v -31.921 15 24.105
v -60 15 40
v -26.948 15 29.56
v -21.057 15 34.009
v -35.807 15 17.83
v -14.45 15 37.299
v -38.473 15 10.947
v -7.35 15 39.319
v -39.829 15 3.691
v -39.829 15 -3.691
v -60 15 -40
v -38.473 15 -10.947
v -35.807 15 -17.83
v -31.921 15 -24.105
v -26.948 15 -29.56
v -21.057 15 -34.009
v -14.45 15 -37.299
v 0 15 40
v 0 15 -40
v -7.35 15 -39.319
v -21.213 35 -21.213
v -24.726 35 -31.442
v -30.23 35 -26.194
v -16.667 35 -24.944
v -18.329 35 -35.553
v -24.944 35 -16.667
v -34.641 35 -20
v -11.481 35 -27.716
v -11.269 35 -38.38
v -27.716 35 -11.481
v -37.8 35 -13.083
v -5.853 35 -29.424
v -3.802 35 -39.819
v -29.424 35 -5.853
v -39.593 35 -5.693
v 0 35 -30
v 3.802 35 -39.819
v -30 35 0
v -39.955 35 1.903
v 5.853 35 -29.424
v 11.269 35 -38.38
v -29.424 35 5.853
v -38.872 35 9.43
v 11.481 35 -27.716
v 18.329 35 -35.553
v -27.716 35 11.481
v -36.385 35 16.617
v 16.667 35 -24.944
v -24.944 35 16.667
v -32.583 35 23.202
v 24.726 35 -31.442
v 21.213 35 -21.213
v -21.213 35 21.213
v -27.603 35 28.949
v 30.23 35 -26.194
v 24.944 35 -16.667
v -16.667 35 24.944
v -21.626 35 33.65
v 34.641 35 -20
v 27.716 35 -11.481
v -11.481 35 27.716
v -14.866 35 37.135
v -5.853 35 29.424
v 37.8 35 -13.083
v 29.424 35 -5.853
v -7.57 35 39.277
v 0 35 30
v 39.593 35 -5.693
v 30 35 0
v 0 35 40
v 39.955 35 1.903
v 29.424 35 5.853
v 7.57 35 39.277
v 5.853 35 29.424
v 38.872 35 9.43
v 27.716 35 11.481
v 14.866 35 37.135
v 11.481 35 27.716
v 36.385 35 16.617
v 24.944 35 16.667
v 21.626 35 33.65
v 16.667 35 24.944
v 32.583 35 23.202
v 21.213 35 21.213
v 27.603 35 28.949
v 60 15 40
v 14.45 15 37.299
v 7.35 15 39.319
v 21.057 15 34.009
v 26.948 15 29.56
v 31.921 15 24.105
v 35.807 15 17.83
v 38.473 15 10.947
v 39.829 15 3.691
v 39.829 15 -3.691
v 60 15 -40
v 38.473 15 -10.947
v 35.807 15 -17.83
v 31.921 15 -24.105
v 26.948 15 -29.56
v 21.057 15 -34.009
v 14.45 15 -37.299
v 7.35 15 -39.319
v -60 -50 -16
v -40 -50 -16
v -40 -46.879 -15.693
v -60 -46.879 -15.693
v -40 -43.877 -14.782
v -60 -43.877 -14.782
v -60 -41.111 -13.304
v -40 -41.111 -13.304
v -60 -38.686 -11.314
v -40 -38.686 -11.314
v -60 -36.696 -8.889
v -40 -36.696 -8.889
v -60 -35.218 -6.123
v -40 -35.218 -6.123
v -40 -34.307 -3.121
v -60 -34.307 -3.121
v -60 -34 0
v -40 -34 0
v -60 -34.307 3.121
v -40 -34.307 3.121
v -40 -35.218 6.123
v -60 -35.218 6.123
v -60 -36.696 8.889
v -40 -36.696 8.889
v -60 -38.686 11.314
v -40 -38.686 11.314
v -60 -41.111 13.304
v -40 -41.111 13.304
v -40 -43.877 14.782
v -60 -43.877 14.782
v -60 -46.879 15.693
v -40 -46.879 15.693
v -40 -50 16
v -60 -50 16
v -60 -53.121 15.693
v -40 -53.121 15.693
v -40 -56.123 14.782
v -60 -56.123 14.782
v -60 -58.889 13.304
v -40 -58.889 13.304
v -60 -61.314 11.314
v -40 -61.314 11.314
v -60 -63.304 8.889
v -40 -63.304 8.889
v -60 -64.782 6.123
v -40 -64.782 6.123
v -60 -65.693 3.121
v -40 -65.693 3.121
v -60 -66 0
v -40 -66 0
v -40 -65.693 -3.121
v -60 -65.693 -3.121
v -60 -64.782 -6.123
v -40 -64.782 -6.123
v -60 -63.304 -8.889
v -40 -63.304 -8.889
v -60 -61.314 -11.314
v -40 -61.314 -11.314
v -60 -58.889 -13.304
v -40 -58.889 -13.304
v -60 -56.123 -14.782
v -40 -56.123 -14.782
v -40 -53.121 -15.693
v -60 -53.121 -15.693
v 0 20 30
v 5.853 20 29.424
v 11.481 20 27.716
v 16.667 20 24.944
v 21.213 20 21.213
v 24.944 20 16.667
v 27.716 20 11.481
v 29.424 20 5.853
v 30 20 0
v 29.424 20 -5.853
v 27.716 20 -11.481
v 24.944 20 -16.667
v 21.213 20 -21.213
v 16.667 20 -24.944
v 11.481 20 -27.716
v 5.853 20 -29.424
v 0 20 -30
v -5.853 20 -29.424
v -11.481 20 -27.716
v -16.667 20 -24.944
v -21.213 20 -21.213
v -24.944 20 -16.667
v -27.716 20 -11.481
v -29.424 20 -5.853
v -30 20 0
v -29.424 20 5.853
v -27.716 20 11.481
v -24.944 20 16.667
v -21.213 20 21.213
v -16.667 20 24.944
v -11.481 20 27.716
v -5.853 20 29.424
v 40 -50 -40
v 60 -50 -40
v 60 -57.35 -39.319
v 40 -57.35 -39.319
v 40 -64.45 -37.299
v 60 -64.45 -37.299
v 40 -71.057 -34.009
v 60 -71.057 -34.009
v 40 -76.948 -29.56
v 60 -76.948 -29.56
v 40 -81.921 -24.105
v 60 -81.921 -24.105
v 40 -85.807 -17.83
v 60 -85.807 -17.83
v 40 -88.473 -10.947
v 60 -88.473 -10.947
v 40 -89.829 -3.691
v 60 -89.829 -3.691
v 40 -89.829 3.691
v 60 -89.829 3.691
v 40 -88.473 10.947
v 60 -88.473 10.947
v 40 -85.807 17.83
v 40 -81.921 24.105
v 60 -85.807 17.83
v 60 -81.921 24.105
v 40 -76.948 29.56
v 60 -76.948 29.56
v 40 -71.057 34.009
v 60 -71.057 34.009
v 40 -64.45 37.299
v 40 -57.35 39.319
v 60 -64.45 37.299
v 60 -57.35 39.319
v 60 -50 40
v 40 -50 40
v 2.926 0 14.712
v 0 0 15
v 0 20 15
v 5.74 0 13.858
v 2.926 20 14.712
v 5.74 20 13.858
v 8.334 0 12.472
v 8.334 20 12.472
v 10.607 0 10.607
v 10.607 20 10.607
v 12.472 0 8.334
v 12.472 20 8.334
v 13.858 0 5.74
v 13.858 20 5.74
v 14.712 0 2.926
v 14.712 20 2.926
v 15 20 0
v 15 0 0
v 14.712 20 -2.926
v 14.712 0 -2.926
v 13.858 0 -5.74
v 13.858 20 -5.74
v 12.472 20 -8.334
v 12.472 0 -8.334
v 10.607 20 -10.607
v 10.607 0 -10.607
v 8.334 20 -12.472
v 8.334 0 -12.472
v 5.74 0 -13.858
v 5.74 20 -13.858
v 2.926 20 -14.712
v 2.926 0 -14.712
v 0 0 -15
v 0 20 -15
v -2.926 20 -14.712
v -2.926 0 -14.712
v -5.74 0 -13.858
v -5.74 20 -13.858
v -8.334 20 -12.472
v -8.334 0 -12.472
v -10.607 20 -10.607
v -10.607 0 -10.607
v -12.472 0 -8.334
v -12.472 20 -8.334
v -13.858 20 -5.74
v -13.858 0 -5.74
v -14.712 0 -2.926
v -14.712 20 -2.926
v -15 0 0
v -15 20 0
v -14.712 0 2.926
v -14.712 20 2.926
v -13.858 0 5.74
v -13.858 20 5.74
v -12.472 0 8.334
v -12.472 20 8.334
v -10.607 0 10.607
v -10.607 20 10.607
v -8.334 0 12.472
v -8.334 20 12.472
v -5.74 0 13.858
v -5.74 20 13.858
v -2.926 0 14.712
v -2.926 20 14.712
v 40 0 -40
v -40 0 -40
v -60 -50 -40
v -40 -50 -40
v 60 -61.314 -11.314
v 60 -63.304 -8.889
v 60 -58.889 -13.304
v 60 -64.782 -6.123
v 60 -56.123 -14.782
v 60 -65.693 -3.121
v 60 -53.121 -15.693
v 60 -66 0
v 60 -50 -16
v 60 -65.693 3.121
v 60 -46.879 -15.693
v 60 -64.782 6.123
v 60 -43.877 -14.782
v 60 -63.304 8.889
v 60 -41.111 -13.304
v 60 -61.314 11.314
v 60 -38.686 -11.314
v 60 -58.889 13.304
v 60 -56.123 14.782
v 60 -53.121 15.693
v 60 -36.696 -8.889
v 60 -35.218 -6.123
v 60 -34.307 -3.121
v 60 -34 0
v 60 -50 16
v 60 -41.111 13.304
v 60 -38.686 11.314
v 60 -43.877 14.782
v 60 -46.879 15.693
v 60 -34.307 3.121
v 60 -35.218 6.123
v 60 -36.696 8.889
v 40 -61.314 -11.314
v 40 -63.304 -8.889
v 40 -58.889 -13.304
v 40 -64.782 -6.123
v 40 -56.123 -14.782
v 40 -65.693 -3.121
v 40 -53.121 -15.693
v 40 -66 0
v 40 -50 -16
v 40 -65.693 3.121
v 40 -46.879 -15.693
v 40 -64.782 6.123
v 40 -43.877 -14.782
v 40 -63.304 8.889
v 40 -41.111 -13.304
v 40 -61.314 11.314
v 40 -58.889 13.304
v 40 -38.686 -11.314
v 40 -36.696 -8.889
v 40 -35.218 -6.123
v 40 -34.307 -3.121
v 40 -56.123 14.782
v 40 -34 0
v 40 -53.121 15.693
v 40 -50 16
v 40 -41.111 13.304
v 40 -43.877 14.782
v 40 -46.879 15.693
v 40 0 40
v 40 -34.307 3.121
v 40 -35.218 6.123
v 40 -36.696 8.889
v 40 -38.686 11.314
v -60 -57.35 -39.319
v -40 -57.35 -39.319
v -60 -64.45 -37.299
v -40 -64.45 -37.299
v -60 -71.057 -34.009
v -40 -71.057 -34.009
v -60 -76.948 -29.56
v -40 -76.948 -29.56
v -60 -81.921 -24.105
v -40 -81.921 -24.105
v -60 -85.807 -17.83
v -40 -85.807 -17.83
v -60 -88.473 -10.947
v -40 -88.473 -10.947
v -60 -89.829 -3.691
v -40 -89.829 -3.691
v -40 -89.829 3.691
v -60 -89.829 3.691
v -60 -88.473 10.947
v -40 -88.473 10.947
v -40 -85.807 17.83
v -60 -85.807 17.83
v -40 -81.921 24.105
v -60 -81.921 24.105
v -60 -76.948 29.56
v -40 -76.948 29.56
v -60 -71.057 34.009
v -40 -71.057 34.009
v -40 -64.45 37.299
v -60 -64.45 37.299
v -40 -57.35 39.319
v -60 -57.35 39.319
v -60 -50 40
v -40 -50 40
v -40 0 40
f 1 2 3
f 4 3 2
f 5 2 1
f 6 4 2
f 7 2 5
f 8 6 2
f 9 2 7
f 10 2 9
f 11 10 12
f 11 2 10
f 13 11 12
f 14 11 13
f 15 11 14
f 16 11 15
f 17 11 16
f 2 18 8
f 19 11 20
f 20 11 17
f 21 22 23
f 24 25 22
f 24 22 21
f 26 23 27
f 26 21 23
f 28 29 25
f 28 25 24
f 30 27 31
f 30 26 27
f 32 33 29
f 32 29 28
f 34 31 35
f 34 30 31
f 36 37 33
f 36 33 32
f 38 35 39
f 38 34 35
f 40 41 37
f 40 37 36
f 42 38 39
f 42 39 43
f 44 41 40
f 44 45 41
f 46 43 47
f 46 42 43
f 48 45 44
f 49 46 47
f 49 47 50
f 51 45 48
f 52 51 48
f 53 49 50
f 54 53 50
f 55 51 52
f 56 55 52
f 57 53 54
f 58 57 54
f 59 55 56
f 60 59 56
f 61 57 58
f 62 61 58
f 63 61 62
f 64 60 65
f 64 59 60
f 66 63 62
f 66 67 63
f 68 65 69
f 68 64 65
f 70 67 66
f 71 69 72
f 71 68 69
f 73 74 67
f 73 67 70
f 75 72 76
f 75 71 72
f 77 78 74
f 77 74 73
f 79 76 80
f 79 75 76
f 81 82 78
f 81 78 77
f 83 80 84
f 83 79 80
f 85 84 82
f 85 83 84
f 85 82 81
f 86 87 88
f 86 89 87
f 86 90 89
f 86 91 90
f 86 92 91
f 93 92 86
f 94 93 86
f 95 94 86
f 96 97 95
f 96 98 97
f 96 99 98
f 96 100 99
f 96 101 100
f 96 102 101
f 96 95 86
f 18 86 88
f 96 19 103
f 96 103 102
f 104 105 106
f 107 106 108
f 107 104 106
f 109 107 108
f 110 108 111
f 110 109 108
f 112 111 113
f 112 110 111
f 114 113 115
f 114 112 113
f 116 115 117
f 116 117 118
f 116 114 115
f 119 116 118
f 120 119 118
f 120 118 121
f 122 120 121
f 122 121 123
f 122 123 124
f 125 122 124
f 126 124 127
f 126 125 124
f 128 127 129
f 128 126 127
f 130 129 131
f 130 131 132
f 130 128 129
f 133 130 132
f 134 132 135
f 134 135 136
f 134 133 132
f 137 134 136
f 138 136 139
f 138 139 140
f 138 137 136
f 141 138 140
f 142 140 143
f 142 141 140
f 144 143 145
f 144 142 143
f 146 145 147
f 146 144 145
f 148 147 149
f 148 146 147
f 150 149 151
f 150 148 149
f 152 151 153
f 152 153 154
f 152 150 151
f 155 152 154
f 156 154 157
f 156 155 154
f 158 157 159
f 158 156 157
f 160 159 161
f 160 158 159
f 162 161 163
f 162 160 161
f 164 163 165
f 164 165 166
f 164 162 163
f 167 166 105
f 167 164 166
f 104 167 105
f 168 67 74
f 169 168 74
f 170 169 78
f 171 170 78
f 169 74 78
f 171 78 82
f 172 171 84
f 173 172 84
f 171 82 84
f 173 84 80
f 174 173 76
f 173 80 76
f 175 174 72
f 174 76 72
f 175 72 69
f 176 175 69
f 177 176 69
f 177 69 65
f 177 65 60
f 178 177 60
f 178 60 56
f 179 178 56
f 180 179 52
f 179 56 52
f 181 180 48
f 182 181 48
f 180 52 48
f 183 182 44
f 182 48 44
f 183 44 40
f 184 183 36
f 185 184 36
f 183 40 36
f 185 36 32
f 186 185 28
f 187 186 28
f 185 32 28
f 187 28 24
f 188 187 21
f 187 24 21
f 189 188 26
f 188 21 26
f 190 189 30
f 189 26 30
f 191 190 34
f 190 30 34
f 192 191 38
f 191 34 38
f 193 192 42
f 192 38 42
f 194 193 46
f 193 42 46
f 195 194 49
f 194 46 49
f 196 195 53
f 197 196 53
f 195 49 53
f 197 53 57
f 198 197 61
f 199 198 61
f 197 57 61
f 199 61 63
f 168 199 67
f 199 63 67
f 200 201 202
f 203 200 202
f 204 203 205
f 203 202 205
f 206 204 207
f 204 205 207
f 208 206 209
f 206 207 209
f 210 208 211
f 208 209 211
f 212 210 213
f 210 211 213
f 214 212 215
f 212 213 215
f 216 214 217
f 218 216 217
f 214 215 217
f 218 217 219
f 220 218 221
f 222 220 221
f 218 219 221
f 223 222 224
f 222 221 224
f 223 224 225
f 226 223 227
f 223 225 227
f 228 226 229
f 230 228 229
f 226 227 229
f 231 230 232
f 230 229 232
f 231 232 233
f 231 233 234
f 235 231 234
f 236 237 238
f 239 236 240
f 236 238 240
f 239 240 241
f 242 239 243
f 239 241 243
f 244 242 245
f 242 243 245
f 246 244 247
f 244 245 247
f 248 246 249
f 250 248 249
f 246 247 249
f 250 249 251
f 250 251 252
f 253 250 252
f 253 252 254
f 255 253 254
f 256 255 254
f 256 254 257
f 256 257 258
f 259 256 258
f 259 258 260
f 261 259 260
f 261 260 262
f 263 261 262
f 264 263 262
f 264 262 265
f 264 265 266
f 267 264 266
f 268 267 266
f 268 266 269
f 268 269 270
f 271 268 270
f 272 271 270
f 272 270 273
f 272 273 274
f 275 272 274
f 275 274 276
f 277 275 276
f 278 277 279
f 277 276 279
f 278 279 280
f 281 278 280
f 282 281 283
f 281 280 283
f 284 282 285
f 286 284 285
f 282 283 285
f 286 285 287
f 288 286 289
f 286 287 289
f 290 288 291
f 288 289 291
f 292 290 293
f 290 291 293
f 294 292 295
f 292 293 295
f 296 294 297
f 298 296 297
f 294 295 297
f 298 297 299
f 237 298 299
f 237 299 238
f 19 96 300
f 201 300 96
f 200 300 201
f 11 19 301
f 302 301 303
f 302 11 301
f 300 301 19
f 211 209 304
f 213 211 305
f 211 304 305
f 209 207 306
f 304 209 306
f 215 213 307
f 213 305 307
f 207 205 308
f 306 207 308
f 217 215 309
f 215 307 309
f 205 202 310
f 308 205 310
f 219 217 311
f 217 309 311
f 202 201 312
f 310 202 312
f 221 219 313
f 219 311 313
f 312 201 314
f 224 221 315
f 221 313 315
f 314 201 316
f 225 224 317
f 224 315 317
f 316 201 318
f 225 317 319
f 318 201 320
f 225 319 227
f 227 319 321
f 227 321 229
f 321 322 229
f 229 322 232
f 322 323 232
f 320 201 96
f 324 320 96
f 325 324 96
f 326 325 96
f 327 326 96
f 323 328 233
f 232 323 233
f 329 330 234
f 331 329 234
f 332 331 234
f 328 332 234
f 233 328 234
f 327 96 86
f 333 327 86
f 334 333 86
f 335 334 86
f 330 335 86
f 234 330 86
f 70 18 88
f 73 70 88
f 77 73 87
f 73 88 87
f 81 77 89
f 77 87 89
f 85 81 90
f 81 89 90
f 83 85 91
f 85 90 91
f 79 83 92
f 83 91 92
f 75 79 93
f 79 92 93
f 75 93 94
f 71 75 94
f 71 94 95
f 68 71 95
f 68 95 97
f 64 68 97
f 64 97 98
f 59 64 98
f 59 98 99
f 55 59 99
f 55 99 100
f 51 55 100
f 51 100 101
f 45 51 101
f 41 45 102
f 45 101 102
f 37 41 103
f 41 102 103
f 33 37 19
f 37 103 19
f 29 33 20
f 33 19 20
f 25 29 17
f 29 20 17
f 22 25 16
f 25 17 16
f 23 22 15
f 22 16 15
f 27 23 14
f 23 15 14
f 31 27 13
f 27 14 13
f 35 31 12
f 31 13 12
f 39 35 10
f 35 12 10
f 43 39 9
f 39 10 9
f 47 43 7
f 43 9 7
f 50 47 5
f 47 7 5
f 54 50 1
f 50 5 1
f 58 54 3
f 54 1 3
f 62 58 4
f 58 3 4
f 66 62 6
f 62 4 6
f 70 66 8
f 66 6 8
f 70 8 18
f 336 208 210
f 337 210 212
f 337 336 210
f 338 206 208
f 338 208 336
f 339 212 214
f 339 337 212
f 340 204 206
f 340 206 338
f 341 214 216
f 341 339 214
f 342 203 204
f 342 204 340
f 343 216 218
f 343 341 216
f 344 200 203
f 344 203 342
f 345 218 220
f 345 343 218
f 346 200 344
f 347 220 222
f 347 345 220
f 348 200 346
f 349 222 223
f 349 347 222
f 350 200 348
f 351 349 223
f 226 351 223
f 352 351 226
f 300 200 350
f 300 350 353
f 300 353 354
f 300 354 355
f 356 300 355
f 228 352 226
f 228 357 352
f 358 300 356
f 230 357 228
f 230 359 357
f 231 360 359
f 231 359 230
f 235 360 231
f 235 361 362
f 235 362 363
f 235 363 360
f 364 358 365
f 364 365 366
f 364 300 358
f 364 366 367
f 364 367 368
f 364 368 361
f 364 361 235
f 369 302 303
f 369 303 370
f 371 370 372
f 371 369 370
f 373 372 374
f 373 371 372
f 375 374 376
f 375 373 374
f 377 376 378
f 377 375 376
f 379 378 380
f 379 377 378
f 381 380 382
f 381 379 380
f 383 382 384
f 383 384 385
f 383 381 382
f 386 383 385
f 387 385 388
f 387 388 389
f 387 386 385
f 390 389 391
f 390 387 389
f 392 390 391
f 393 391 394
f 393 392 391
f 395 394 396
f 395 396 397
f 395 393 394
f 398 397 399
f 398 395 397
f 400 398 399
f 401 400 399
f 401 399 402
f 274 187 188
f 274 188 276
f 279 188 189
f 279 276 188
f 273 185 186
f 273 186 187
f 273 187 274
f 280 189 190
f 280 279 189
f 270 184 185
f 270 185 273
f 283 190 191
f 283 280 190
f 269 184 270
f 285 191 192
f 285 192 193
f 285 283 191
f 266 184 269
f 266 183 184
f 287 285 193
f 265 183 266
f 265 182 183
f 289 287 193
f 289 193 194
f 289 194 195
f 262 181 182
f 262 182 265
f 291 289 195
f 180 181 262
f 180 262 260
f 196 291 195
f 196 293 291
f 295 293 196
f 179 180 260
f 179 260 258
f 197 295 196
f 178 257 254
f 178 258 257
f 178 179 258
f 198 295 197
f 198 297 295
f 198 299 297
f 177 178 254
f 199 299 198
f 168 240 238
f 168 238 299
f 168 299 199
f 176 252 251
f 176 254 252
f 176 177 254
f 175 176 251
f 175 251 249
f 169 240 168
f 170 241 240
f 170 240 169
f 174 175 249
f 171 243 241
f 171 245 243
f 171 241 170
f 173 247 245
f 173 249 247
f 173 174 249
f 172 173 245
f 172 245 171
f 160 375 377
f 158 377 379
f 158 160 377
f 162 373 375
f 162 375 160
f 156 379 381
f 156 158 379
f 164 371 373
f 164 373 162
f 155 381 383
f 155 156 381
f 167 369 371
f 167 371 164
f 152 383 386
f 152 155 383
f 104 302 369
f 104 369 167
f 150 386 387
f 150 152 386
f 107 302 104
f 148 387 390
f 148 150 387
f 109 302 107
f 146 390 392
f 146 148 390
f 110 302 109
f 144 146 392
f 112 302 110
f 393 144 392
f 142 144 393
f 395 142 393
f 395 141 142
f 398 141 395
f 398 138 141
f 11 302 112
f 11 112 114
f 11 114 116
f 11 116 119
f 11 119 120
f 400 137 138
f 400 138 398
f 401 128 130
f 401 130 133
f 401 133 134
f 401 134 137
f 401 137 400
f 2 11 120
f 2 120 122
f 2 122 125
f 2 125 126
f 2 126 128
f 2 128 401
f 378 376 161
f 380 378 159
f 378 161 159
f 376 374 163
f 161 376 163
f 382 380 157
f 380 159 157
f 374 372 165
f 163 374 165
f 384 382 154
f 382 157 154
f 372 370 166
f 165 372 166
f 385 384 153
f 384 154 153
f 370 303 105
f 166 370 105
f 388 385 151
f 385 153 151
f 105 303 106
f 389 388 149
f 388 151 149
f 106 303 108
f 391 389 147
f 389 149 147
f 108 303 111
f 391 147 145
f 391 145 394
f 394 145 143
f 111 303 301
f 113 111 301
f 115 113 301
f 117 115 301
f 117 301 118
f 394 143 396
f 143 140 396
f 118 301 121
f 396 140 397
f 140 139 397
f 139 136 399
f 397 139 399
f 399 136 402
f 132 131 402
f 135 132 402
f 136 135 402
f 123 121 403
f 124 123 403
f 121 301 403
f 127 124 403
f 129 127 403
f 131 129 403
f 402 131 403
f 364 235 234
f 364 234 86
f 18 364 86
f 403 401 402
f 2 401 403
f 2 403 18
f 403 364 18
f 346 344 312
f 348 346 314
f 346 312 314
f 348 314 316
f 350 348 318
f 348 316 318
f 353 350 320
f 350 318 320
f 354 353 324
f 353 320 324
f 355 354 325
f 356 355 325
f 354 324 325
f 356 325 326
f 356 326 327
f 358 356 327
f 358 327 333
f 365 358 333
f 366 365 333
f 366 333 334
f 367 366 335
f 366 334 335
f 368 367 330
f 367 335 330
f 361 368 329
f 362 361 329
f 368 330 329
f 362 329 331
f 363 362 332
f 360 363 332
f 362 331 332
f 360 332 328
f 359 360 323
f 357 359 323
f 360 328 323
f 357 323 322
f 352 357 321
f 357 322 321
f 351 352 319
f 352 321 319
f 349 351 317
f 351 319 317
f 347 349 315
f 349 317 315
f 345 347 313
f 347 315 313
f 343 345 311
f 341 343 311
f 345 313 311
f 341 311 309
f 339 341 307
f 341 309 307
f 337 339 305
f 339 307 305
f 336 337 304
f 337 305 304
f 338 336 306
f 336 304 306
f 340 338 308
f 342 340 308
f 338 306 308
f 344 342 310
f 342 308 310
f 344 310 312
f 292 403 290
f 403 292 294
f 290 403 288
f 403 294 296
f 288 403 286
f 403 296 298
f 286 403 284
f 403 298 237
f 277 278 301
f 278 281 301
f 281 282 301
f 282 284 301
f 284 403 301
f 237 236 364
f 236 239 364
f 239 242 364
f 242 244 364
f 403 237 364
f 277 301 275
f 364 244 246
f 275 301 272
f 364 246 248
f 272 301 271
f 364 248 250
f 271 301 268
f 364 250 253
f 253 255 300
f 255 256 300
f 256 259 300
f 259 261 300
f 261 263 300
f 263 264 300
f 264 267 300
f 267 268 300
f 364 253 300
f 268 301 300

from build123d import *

# Parameters (mm, degrees)
SKETCH1_W           = 120
SKETCH1_H           = 80
BOSS_EXTRUDE1_DEPTH = 15
SKETCH2_R           = 40
BOSS_EXTRUDE2_DEPTH = 20
SKETCH3_R           = 30
CUT_EXTRUDE3_DEPTH  = 15
SKETCH4_R           = 15
CUT_EXTRUDE4_DEPTH  = 29
BOSS_EXTRUDE5_DEPTH = 20
SKETCH8_R           = 16
CUT_EXTRUDE6_DEPTH  = 20


with BuildPart() as part:
    # Sketch1 → Boss-Extrude1 (new body)
    with BuildSketch(Plane(origin=(0, 0, 0), x_dir=(1, 0, 0), z_dir=(0, 1, 0))):
        Rectangle(SKETCH1_W, SKETCH1_H)
    extrude(amount=BOSS_EXTRUDE1_DEPTH)

    # Sketch2 → Boss-Extrude2 (add)
    with BuildSketch(Plane(origin=(0, 15, 0), x_dir=(1, 0, 0), z_dir=(0, 1, 0))):
        with Locations(Location((0, 0, 0), (0, 0, 270))):
            Circle(SKETCH2_R)
    extrude(amount=BOSS_EXTRUDE2_DEPTH)

    # Sketch3 → Cut-Extrude3 (cut)
    with BuildSketch(Plane(origin=(0, 35, 0), x_dir=(1, 0, 0), z_dir=(0, 1, 0))):
        with Locations(Location((0, 0, 0), (0, 0, 270))):
            Circle(SKETCH3_R)
    extrude(amount=-CUT_EXTRUDE3_DEPTH, mode=Mode.SUBTRACT)

    # Sketch4 → Cut-Extrude4 (cut)
    with BuildSketch(Plane(origin=(0, 20, 0), x_dir=(1, 0, 0), z_dir=(0, 1, 0))):
        with Locations(Location((0, 0, 0), (0, 0, 270))):
            Circle(SKETCH4_R)
    extrude(amount=-CUT_EXTRUDE4_DEPTH, mode=Mode.SUBTRACT)

    # Sketch5 → Boss-Extrude5 (add)
    with BuildSketch(Plane(origin=(60, 0, 0), x_dir=(0, 0, -1), z_dir=(1, 0, 0))):
        with BuildLine():
            Line((-40, 0), (40, 0))
            Line((40, 0), (40, -50))
            ThreePointArc((40, -50), (0, -90), (-40, -50))
            Line((-40, -50), (-40, 0))
        make_face()
    boss_extrude5 = extrude(amount=-BOSS_EXTRUDE5_DEPTH)

    # Sketch8 → Cut-Extrude6 (cut)
    with BuildSketch(Plane(origin=(60, 0, 0), x_dir=(0, 0, -1), z_dir=(1, 0, 0))):
        with Locations((0, -50)):
            Circle(SKETCH8_R)
    cut_extrude6 = extrude(amount=-CUT_EXTRUDE6_DEPTH, mode=Mode.SUBTRACT)

    # Mirror1: Boss-Extrude5, Cut-Extrude6 across plane
    add(boss_extrude5.mirror(Plane(origin=(0, 0, 0), x_dir=(0, 0, 1), z_dir=(1, 0, 0))))
    add(cut_extrude6.mirror(Plane(origin=(0, 0, 0), x_dir=(0, 0, 1), z_dir=(1, 0, 0))), mode=Mode.SUBTRACT)


solid = part.part
